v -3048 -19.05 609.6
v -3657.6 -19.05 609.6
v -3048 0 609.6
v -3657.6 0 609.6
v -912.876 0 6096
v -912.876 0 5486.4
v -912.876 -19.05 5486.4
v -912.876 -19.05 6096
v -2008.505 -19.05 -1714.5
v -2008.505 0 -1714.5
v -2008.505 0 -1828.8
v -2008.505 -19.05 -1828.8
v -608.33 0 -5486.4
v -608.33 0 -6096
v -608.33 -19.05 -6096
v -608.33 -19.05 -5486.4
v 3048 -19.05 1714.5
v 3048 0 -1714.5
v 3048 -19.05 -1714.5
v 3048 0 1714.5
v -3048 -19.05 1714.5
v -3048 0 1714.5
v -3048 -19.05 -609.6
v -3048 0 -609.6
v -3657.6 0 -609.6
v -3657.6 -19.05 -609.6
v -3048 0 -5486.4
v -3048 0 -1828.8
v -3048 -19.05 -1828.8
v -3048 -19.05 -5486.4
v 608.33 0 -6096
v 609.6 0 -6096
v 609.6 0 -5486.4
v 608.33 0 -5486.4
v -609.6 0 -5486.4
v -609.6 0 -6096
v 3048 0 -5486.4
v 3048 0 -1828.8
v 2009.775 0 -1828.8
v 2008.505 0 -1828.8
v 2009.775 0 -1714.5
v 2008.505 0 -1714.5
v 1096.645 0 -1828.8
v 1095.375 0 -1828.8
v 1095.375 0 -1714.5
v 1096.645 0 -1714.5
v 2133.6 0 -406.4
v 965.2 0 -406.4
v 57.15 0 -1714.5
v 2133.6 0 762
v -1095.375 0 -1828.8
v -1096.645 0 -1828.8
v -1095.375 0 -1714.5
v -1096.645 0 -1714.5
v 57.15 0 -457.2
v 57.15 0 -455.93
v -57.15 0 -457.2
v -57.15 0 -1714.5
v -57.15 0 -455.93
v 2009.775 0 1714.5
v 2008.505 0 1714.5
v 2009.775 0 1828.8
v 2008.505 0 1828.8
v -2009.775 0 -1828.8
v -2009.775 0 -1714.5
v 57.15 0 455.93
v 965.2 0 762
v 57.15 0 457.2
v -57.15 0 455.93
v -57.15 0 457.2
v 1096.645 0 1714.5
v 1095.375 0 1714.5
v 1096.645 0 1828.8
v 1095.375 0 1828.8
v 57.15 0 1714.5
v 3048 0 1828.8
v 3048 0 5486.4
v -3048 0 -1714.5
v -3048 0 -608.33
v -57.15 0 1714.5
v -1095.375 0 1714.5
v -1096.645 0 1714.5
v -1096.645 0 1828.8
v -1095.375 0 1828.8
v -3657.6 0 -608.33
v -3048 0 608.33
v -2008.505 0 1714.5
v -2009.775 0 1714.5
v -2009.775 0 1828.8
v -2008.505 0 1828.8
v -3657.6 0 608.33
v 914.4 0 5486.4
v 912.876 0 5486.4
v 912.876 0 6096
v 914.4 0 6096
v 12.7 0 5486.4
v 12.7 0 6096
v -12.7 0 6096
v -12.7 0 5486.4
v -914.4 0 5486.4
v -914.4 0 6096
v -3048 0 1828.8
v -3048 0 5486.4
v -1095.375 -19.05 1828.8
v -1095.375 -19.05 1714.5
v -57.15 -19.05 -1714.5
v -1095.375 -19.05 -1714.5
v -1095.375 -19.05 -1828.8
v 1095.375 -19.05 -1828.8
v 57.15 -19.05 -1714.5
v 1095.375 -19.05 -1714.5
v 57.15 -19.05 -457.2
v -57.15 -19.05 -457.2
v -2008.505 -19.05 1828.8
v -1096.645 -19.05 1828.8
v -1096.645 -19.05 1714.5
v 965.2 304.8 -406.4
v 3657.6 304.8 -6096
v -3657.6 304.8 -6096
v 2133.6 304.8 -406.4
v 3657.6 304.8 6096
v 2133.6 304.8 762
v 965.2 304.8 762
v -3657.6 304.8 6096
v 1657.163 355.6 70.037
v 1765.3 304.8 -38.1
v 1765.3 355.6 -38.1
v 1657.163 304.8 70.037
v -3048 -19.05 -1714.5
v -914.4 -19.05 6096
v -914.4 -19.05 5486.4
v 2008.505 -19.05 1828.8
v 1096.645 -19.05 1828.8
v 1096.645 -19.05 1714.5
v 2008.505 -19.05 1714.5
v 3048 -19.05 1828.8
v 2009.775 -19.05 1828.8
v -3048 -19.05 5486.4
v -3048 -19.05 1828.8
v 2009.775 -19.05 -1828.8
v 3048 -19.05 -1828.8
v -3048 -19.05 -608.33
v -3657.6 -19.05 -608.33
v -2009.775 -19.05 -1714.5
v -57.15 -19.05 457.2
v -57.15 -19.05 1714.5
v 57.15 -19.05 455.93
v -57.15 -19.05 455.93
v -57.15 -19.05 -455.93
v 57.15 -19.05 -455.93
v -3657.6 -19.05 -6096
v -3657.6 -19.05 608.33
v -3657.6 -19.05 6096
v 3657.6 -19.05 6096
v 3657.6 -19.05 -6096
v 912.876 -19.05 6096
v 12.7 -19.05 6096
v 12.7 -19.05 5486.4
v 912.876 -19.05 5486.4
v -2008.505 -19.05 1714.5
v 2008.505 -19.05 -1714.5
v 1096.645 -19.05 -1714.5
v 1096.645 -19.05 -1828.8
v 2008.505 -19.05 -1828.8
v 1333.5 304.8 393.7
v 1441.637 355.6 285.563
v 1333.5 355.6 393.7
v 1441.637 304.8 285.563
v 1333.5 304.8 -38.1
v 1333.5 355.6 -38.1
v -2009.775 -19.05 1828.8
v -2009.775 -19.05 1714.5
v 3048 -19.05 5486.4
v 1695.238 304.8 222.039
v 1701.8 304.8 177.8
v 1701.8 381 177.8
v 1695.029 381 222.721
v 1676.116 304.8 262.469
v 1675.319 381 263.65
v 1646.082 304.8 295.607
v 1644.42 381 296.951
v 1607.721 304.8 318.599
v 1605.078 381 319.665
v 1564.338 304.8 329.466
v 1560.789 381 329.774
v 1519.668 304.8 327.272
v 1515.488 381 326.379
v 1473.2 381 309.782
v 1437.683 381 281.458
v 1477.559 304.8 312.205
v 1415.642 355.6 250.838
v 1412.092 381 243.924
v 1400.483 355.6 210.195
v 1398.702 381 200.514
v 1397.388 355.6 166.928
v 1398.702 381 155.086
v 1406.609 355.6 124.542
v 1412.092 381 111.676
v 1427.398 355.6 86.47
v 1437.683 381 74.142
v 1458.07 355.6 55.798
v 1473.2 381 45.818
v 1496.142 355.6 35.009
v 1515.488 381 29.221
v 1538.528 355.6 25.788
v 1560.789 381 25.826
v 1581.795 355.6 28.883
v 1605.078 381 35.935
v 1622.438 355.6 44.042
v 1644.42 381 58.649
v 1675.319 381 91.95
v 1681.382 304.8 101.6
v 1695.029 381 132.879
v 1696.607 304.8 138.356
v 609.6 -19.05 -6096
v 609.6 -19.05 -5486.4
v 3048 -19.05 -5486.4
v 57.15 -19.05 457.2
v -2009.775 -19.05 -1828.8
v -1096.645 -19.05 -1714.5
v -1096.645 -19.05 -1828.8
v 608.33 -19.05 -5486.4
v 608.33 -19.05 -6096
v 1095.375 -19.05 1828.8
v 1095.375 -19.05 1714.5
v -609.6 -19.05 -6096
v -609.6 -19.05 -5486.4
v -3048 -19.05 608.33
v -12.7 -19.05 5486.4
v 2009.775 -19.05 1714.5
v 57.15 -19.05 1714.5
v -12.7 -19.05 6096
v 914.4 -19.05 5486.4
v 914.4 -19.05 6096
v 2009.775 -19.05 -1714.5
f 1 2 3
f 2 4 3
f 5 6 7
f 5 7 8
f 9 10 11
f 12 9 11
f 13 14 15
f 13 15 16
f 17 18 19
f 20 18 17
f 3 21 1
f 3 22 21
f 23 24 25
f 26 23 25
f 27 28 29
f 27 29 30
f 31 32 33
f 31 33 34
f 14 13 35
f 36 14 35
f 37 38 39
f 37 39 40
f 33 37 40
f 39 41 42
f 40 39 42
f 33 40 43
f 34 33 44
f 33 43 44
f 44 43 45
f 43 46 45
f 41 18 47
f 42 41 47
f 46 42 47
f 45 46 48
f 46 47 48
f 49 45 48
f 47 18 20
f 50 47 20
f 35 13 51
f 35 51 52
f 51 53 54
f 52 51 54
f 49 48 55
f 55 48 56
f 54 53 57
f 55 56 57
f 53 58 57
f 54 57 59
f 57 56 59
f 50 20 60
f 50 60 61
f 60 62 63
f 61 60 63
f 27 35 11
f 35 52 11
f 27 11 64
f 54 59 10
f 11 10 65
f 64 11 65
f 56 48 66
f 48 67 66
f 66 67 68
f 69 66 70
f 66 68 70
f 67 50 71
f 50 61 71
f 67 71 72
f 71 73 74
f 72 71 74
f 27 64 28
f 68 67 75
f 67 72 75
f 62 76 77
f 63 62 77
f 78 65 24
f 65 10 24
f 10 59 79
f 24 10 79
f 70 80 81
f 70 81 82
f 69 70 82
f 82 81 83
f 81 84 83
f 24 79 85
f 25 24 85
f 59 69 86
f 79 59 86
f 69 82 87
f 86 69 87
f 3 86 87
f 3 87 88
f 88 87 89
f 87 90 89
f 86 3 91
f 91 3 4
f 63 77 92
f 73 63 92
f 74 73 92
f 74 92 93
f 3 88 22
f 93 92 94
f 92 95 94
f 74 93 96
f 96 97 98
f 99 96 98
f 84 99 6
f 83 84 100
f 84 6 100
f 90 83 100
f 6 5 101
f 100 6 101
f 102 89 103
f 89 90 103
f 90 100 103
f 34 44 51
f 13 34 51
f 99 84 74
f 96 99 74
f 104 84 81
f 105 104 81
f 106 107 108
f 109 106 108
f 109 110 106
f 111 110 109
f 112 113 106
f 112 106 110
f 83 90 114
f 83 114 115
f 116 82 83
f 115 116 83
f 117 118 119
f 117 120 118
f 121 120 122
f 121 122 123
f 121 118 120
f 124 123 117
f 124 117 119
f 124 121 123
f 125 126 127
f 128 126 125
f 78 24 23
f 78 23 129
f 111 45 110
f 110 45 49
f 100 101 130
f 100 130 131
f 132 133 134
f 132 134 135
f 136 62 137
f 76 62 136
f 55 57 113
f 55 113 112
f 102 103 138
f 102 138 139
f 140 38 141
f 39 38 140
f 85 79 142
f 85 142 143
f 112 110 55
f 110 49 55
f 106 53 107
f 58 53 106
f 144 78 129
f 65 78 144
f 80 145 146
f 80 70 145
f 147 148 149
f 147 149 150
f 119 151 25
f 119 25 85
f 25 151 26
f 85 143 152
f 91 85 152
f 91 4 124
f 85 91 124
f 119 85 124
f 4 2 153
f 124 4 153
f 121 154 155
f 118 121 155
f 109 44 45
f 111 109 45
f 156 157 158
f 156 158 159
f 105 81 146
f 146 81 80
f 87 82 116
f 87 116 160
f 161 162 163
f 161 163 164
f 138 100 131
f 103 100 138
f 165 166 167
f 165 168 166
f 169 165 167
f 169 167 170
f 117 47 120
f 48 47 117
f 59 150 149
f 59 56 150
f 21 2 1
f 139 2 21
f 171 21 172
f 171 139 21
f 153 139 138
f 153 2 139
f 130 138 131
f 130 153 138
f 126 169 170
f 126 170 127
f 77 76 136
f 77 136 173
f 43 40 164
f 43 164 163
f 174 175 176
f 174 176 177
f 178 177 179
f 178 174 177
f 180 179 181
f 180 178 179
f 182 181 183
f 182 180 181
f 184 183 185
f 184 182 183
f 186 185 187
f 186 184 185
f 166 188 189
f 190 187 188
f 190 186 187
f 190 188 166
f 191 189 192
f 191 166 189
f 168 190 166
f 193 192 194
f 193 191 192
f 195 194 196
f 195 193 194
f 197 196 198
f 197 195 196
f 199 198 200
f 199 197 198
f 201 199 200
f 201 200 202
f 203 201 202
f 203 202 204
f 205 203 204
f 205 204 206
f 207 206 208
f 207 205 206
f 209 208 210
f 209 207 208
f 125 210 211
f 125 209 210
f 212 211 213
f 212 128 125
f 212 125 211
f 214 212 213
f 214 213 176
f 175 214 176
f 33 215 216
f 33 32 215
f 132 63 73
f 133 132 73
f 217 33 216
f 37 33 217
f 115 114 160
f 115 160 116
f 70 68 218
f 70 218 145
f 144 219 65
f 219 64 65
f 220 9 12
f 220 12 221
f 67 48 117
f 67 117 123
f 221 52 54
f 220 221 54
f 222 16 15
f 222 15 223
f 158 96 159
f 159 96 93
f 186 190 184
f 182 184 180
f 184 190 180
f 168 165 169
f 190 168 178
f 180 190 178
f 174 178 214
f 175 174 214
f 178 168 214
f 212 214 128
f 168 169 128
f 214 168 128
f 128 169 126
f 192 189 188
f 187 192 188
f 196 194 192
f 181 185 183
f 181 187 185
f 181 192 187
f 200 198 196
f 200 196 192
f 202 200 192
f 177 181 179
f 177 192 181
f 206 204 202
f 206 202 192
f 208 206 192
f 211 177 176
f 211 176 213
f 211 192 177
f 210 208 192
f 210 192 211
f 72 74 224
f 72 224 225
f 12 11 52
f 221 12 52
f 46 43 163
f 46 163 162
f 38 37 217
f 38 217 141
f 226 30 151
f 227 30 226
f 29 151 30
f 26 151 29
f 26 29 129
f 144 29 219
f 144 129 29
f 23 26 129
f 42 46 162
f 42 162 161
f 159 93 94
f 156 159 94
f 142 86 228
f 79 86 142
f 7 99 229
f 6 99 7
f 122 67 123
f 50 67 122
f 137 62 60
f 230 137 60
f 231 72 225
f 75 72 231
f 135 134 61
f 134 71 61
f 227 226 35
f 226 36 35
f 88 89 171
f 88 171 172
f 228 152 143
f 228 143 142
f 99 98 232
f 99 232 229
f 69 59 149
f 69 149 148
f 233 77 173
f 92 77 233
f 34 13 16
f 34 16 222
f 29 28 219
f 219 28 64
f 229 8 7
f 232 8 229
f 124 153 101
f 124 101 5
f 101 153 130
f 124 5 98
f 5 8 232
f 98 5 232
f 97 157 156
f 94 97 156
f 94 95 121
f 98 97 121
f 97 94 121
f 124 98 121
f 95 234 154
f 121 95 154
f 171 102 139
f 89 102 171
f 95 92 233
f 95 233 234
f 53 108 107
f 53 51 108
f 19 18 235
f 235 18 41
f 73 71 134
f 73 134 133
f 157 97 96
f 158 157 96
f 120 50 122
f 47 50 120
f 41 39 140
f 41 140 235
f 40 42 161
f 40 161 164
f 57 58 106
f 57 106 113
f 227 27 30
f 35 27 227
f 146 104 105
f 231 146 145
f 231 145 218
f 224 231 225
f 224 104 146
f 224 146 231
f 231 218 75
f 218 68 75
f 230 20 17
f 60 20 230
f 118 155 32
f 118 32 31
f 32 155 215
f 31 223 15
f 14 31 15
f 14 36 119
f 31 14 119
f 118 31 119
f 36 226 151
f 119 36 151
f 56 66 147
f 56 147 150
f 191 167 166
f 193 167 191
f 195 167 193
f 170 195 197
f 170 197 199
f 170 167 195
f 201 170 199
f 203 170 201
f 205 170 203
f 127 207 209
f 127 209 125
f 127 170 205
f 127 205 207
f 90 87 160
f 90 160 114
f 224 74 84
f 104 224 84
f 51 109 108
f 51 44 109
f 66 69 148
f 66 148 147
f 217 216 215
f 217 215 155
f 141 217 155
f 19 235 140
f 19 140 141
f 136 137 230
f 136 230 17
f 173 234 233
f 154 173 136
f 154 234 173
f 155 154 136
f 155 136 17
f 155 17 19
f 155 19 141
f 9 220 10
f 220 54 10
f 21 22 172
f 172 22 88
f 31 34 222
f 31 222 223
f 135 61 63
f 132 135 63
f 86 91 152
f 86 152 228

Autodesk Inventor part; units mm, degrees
ref_plane "YZ Plane" through (0, 0, 0) normal (1, 0, 0) x (0, 1, 0)
ref_plane "XZ Plane" through (0, 0, 0) normal (0, 1, 0) x (-1, 0, 0)
ref_plane "XY Plane" through (0, 0, 0) normal (0, 0, 1) x (1, 0, 0)
sketch "Sketch1" plane through (0, 0, 0) normal (0, 1, 0) x (-1, 0, 0)
  line L0 (3657.6, -6096) -> (3657.6, 6096)
  line L1 (-3657.6, 6096) -> (-3657.6, -6096)
  line L2 (-3657.6, -6096) -> (-609.6, -6096)
  line L3 (609.6, -6096) -> (3657.6, -6096)
  line L4 (3657.6, 6096) -> (914.4, 6096)
  line L5 (-914.4, 6096) -> (-3657.6, 6096)
  line L6 (0, -8534.4) -> (0, 8534.4) projected
  line L7 (-5120.64, 0) -> (5120.64, 0) projected
  line L8 (-3657.6, -6096) -> (3657.6, -6096)
  line L9 (3657.6, -6096) -> (3657.6, 6096)
  line L10 (3657.6, 6096) -> (-3657.6, 6096)
  line L11 (-3657.6, 6096) -> (-3657.6, -6096)
  line L12 (-2133.6, -406.4) -> (-965.2, -406.4)
  line L13 (-965.2, -406.4) -> (-965.2, 762)
  line L14 (-965.2, 762) -> (-2133.6, 762)
  line L15 (-2133.6, 762) -> (-2133.6, -406.4)
  dimension "d0" = 7315.2
  dimension "d12" = 12192
  dimension "d16" = 1168.4
  dimension "d17" = 1168.4
  dimension "d18" = 1524
  dimension "d19" = 5689.6
extrude "Extrusion1" add sketch "Sketch1" along normal blind 304.8 contours L3 L8 L6 L7 L0 | L7 L6 L10 L4 L0 | L7 L13 L14 L15 L1 L5 L10 L6 | L6 L8 L2 L1 L7 L15 L12 L13
sketch "Sketch2" plane through (0, 0, 0) normal (0, -1, 0) x (1, 0, 0)
  line L0 (3657.6, -6096) -> (3657.6, 6096)
  line L1 (-3657.6, 6096) -> (-3657.6, -6096)
  line L2 (-3048, 1714.5) -> (-3048, -1714.5)
  line L3 (3048, -5486.4) -> (3048, -1828.8)
  line L4 (3048, -1714.5) -> (3048, 1714.5)
  line L5 (3048, 1828.8) -> (3048, 5486.4)
  line L6 (-3048, -1828.8) -> (-3048, -5486.4)
  line L7 (-3048, 5486.4) -> (-3048, 1828.8)
  line L8 (-3048, 1714.5) -> (-3048, -1714.5)
  line L9 (-2009.775, -1828.8) -> (-2009.775, -1714.5)
  line L10 (-1095.375, -1828.8) -> (-1095.375, -1714.5)
  line L11 (-3048, -1714.5) -> (-2009.775, -1714.5)
  line L12 (-1095.375, -1714.5) -> (-57.15, -1714.5)
  line L13 (-3048, -1828.8) -> (-2009.775, -1828.8)
  line L14 (3048, -1714.5) -> (2009.775, -1714.5)
  line L15 (3048, -1828.8) -> (2009.775, -1828.8)
  line L16 (2009.775, -1828.8) -> (2009.775, -1714.5)
  line L17 (1095.375, -1828.8) -> (1095.375, -1714.5)
  line L18 (1095.375, -1714.5) -> (57.15, -1714.5)
  line L19 (1095.375, -1828.8) -> (-1095.375, -1828.8)
  line L20 (-2009.775, -1828.8) -> (-3048, -1828.8)
  line L21 (-1095.375, -1828.8) -> (1095.375, -1828.8)
  line L22 (2009.775, -1828.8) -> (3048, -1828.8)
  line L23 (57.15, -1714.5) -> (1095.375, -1714.5)
  line L24 (2009.775, -1714.5) -> (3048, -1714.5)
  line L25 (2009.775, 1828.8) -> (3048, 1828.8)
  line L26 (3048, 1828.8) -> (2009.775, 1828.8)
  line L27 (3048, 1714.5) -> (2009.775, 1714.5)
  line L28 (2009.775, 1714.5) -> (3048, 1714.5)
  line L29 (1095.375, 1714.5) -> (57.15, 1714.5)
  line L30 (-1095.375, 1828.8) -> (-1095.375, 1714.5)
  line L31 (-3048, 1714.5) -> (-2009.775, 1714.5)
  line L32 (-1095.375, 1714.5) -> (-57.15, 1714.5)
  line L33 (-3048, 1828.8) -> (-2009.775, 1828.8)
  line L34 (2009.775, 1828.8) -> (2009.775, 1714.5)
  line L35 (1095.375, 1828.8) -> (1095.375, 1714.5)
  line L36 (1095.375, 1828.8) -> (-1095.375, 1828.8)
  line L37 (-2009.775, 1828.8) -> (-3048, 1828.8)
  line L38 (-1095.375, 1828.8) -> (1095.375, 1828.8)
  line L39 (57.15, 1714.5) -> (1095.375, 1714.5)
  line L40 (-2009.775, 1828.8) -> (-2009.775, 1714.5)
  line L41 (-57.15, -457.2) -> (57.15, -457.2)
  line L42 (57.15, 457.2) -> (-57.15, 457.2)
  line L43 (-609.6, -6096) -> (-609.6, -5486.4)
  line L44 (609.6, -6096) -> (609.6, -5486.4)
  line L45 (-3048, -5486.4) -> (-609.6, -5486.4)
  line L46 (609.6, -5486.4) -> (3048, -5486.4)
  line L47 (-3657.6, -6096) -> (-609.6, -6096)
  line L48 (609.6, -6096) -> (3657.6, -6096)
  line L49 (914.4, 5486.4) -> (914.4, 6096)
  line L50 (-914.4, 6096) -> (-914.4, 5486.4)
  line L51 (3048, 5486.4) -> (914.4, 5486.4)
  line L52 (-914.4, 5486.4) -> (-3048, 5486.4)
  line L53 (3657.6, 6096) -> (914.4, 6096)
  line L54 (-914.4, 6096) -> (-3657.6, 6096)
  line L55 (-57.15, -1714.5) -> (-57.15, -457.2)
  line L56 (-57.15, 457.2) -> (-57.15, 1714.5)
  line L57 (-57.15, 1714.5) -> (-57.15, 457.2)
  line L58 (-57.15, -457.2) -> (-57.15, -1714.5)
  line L59 (57.15, -1714.5) -> (57.15, -457.2)
  line L60 (57.15, 457.2) -> (57.15, 1714.5)
  line L61 (57.15, 1714.5) -> (57.15, 457.2)
  line L62 (57.15, -457.2) -> (57.15, -1714.5)
  line L63 (-3048, 5486.4) -> (-3048, 1828.8)
  line L64 (-3048, 1828.8) -> (-2009.775, 1828.8)
  line L65 (-2009.775, 1828.8) -> (-2009.775, 1714.5)
  line L66 (-2009.775, 1714.5) -> (-3048, 1714.5)
  line L67 (-3048, 1714.5) -> (-3048, -1714.5)
  line L68 (-3048, -1714.5) -> (-2009.775, -1714.5)
  line L69 (-2009.775, -1714.5) -> (-2009.775, -1828.8)
  line L70 (-2009.775, -1828.8) -> (-3048, -1828.8)
  line L71 (-3048, -1828.8) -> (-3048, -5486.4)
  line L72 (-3048, -5486.4) -> (-609.6, -5486.4)
  line L73 (609.6, -5486.4) -> (3048, -5486.4)
  line L74 (3048, -5486.4) -> (3048, -1828.8)
  line L75 (3048, -1828.8) -> (2009.775, -1828.8)
  line L76 (2009.775, -1828.8) -> (2009.775, -1714.5)
  line L77 (2009.775, -1714.5) -> (3048, -1714.5)
  line L78 (3048, 1714.5) -> (3048, -1714.5)
  line L79 (3048, 1714.5) -> (2009.775, 1714.5)
  line L80 (2009.775, 1714.5) -> (2009.775, 1828.8)
  line L81 (2009.775, 1828.8) -> (3048, 1828.8)
  line L82 (3048, 1828.8) -> (3048, 5486.4)
  line L83 (3657.6, 6096) -> (-3657.6, 6096) projected
  line L84 (0, 8534.4) -> (0, -8534.4) projected
  line L85 (-12.7, 6096) -> (12.7, 6096)
  line L86 (3657.6, -6096) -> (3657.6, 6096) projected
  line L87 (-2009.775, 1828.8) -> (-2008.505, 1828.8)
  line L88 (-1095.375, 1828.8) -> (-1096.645, 1828.8)
  line L89 (-1095.375, 1714.5) -> (-1096.645, 1714.5)
  line L90 (-1096.645, 1714.5) -> (-1096.645, 1828.8)
  line L91 (-2009.775, 1714.5) -> (-2008.505, 1714.5)
  line L92 (-2008.505, 1714.5) -> (-2008.505, 1828.8)
  line L93 (-2008.505, 1828.8) -> (-1096.645, 1828.8)
  line L94 (-1096.645, 1828.8) -> (-1096.645, 1714.5)
  line L95 (-1096.645, 1714.5) -> (-2008.505, 1714.5)
  line L96 (-2008.505, 1714.5) -> (-2008.505, 1828.8)
  line L97 (-5120.64, 0) -> (5120.64, 0) projected
  line L98 (-2009.775, -1828.8) -> (-2008.505, -1828.8)
  line L99 (-1095.375, -1828.8) -> (-1096.645, -1828.8)
  line L100 (-1095.375, -1714.5) -> (-1096.645, -1714.5)
  line L101 (-2009.775, -1714.5) -> (-2008.505, -1714.5)
  line L102 (-2008.505, -1714.5) -> (-2008.505, -1828.8)
  line L103 (-2008.505, -1828.8) -> (-1096.645, -1828.8)
  line L104 (-1096.645, -1828.8) -> (-1096.645, -1714.5)
  line L105 (-1096.645, -1714.5) -> (-2008.505, -1714.5)
  line L106 (2009.775, 1828.8) -> (2008.505, 1828.8)
  line L107 (1095.375, 1828.8) -> (1096.645, 1828.8)
  line L108 (1095.375, 1714.5) -> (1096.645, 1714.5)
  line L109 (1096.645, 1714.5) -> (1096.645, 1828.8)
  line L110 (2009.775, 1714.5) -> (2008.505, 1714.5)
  line L111 (2008.505, 1714.5) -> (2008.505, 1828.8)
  line L112 (2008.505, 1828.8) -> (1096.645, 1828.8)
  line L113 (1096.645, 1714.5) -> (2008.505, 1714.5)
  line L114 (2009.775, -1714.5) -> (2008.505, -1714.5)
  line L115 (2008.505, -1714.5) -> (2008.505, -1828.8)
  line L116 (2009.775, -1828.8) -> (2008.505, -1828.8)
  line L117 (2008.505, -1828.8) -> (1096.645, -1828.8)
  line L118 (1096.645, -1714.5) -> (2008.505, -1714.5)
  line L119 (1095.375, -1714.5) -> (1096.645, -1714.5)
  line L120 (1096.645, -1828.8) -> (1096.645, -1714.5)
  line L121 (1095.375, -1828.8) -> (1096.645, -1828.8)
  line L122 (-3657.6, 6096) -> (-3657.6, -6096) projected
  line L123 (-3657.6, -6096) -> (3657.6, -6096) projected
  line L124 (-2008.505, -1828.8) -> (-1096.645, -1828.8)
  line L125 (-1096.645, -1828.8) -> (-1096.645, -1714.5)
  line L126 (-1096.645, -1714.5) -> (-2008.505, -1714.5)
  line L127 (-2008.505, -1714.5) -> (-2008.505, -1828.8)
  line L128 (1096.645, -1714.5) -> (2008.505, -1714.5)
  line L129 (2008.505, -1714.5) -> (2008.505, -1828.8)
  line L130 (2008.505, -1828.8) -> (1096.645, -1828.8)
  line L131 (1096.645, -1828.8) -> (1096.645, -1714.5)
  line L132 (1096.645, 1828.8) -> (2008.505, 1828.8)
  line L133 (2008.505, 1828.8) -> (2008.505, 1714.5)
  line L134 (2008.505, 1714.5) -> (1096.645, 1714.5)
  line L135 (1096.645, 1714.5) -> (1096.645, 1828.8)
  line L136 (-912.876, 6096) -> (-12.7, 6096)
  line L137 (-12.7, 6096) -> (-12.7, 5486.4)
  line L138 (-12.7, 5486.4) -> (-912.876, 5486.4)
  line L139 (-912.876, 5486.4) -> (-912.876, 6096)
  line L140 (12.7, 6096) -> (12.7, 5486.4)
  line L141 (12.7, 5486.4) -> (912.876, 5486.4)
  line L142 (912.876, 5486.4) -> (912.876, 6096)
  line L143 (-912.876, 5486.4) -> (-12.7, 5486.4)
  line L144 (-12.7, 5486.4) -> (-12.7, 6096)
  line L145 (-12.7, 6096) -> (-912.876, 6096)
  line L146 (-912.876, 6096) -> (-912.876, 5486.4)
  line L147 (12.7, 6096) -> (912.876, 6096)
  line L148 (912.876, 6096) -> (912.876, 5486.4)
  line L149 (912.876, 5486.4) -> (12.7, 5486.4)
  line L150 (12.7, 5486.4) -> (12.7, 6096)
  line L151 (-608.33, -5486.4) -> (608.33, -5486.4)
  line L152 (608.33, -5486.4) -> (608.33, -6096)
  line L153 (608.33, -6096) -> (-608.33, -6096)
  line L154 (-608.33, -6096) -> (-608.33, -5486.4)
  line L155 (-3657.6, 609.6) -> (-3048, 609.6)
  line L156 (-3048, 609.6) -> (-3048, -609.6)
  line L157 (-3048, -609.6) -> (-3657.6, -609.6)
  line L158 (-3657.6, -609.6) -> (-3657.6, 609.6)
  line L159 (-57.15, 455.93) -> (57.15, 455.93)
  line L160 (57.15, 455.93) -> (57.15, -455.93)
  line L161 (57.15, -455.93) -> (-57.15, -455.93)
  line L162 (-57.15, -455.93) -> (-57.15, 455.93)
  line L163 (-3657.6, 608.33) -> (-3048, 608.33)
  line L164 (-3048, 608.33) -> (-3048, -608.33)
  line L165 (-3048, -608.33) -> (-3657.6, -608.33)
  line L166 (-3657.6, -608.33) -> (-3657.6, 608.33)
  point P0 (0, 0)
  point P1 (0, 0)
  point P2 (0, 5486.4)
  dimension "d22" = 7315.2
  dimension "d23" = 609.6
  dimension "d24" = 1038.225
  dimension "d25" = 914.4
  dimension "d26" = 114.3
  dimension "d27" = 1038.225
  dimension "d28" = 1038.225
  dimension "d29" = 914.4
  dimension "d30" = 1219.2
  dimension "d31" = 609.6
  dimension "d32" = 4267.2
  dimension "d33" = 1828.8
  dimension "d34" = 12192
  dimension "d35" = 609.6
  dimension "d36" = 114.3
  dimension "d40" = 1.27
  dimension "d41" = 1.27
  dimension "d42" = 1.524
  dimension "d43" = 12.7
  dimension "d44" = 1.27
  dimension "d45" = 1219.2
  dimension "d48" = 1.27
  dimension "d51" = 1.27
extrude "Extrusion3" add sketch "Sketch2" along normal blind 19.05 contours L48 L44 L46 L3 L15 L16 L14 L4 L97 L0 | L97 L4 L27 L34 L25 L5 L51 L49 L53 L0 | L123 L84 L151 L152 | L123 L154 L151 L84 | L142 L141 L140 L83 | L115 L117 L120 L118 | L113 L109 L112 L111 | L84 L41 L59 L18 L17 L19 | L19 L10 L12 L55 L41 L84 | L47 L1 L157 L2 L11 L9 L13 L6 L45 L43 | L84 L36 L35 L29 L60 L42 | L42 L56 L32 L30 L36 L84 | L97 L1 L163 L2 | L2 L165 L1 L97 | L137 L138 L139 L83 | L103 L102 L105 L104 | L155 L1 L54 L50 L52 L7 L33 L40 L31 L2 | L90 L95 L92 L93
extrude "Extrusion4" add sketch "Sketch2" along normal blind 19.05 contours L160 L161 L84 L97 | L97 L84 L159 L160 | L97 L162 L159 L84 | L84 L161 L162 L97
sketch "Sketch3" plane through (0, 304.8, 0) normal (0, 1, 0) x (1, 0, 0)
  line L0 (2133.6, 406.4) -> (2133.6, -762) projected
  line L1 (965.2, -762) -> (965.2, 406.4) projected
  line L2 (965.2, 406.4) -> (2133.6, 406.4) projected
  circle A0 centre (1549.4, -177.8) radius 152.4
  line L3 (1333.5, 38.1) -> (1765.3, 38.1)
  line L4 (1333.5, -393.7) -> (1333.5, 38.1)
  line L5 (1765.3, 38.1) -> (1333.5, -393.7)
  point P0 (0, 0)
  dimension "d52" = 304.8
  dimension "d53" = 584.2
  dimension "d54" = 584.2
  dimension "d57" = 368.3
  dimension "d58" = 368.3
  dimension "d59" = 431.8
extrude "Extrusion5" add sketch "Sketch3" along normal blind 76.2 contours A0 L5 | L5 A0
extrude "Extrusion6" add sketch "Sketch3" along normal blind 50.8 contours L5 A0 | A0 L5 L4 L3 picked at (1566.1782, -129.8507)
properties part number "East_Structure_Roof_Devices"
